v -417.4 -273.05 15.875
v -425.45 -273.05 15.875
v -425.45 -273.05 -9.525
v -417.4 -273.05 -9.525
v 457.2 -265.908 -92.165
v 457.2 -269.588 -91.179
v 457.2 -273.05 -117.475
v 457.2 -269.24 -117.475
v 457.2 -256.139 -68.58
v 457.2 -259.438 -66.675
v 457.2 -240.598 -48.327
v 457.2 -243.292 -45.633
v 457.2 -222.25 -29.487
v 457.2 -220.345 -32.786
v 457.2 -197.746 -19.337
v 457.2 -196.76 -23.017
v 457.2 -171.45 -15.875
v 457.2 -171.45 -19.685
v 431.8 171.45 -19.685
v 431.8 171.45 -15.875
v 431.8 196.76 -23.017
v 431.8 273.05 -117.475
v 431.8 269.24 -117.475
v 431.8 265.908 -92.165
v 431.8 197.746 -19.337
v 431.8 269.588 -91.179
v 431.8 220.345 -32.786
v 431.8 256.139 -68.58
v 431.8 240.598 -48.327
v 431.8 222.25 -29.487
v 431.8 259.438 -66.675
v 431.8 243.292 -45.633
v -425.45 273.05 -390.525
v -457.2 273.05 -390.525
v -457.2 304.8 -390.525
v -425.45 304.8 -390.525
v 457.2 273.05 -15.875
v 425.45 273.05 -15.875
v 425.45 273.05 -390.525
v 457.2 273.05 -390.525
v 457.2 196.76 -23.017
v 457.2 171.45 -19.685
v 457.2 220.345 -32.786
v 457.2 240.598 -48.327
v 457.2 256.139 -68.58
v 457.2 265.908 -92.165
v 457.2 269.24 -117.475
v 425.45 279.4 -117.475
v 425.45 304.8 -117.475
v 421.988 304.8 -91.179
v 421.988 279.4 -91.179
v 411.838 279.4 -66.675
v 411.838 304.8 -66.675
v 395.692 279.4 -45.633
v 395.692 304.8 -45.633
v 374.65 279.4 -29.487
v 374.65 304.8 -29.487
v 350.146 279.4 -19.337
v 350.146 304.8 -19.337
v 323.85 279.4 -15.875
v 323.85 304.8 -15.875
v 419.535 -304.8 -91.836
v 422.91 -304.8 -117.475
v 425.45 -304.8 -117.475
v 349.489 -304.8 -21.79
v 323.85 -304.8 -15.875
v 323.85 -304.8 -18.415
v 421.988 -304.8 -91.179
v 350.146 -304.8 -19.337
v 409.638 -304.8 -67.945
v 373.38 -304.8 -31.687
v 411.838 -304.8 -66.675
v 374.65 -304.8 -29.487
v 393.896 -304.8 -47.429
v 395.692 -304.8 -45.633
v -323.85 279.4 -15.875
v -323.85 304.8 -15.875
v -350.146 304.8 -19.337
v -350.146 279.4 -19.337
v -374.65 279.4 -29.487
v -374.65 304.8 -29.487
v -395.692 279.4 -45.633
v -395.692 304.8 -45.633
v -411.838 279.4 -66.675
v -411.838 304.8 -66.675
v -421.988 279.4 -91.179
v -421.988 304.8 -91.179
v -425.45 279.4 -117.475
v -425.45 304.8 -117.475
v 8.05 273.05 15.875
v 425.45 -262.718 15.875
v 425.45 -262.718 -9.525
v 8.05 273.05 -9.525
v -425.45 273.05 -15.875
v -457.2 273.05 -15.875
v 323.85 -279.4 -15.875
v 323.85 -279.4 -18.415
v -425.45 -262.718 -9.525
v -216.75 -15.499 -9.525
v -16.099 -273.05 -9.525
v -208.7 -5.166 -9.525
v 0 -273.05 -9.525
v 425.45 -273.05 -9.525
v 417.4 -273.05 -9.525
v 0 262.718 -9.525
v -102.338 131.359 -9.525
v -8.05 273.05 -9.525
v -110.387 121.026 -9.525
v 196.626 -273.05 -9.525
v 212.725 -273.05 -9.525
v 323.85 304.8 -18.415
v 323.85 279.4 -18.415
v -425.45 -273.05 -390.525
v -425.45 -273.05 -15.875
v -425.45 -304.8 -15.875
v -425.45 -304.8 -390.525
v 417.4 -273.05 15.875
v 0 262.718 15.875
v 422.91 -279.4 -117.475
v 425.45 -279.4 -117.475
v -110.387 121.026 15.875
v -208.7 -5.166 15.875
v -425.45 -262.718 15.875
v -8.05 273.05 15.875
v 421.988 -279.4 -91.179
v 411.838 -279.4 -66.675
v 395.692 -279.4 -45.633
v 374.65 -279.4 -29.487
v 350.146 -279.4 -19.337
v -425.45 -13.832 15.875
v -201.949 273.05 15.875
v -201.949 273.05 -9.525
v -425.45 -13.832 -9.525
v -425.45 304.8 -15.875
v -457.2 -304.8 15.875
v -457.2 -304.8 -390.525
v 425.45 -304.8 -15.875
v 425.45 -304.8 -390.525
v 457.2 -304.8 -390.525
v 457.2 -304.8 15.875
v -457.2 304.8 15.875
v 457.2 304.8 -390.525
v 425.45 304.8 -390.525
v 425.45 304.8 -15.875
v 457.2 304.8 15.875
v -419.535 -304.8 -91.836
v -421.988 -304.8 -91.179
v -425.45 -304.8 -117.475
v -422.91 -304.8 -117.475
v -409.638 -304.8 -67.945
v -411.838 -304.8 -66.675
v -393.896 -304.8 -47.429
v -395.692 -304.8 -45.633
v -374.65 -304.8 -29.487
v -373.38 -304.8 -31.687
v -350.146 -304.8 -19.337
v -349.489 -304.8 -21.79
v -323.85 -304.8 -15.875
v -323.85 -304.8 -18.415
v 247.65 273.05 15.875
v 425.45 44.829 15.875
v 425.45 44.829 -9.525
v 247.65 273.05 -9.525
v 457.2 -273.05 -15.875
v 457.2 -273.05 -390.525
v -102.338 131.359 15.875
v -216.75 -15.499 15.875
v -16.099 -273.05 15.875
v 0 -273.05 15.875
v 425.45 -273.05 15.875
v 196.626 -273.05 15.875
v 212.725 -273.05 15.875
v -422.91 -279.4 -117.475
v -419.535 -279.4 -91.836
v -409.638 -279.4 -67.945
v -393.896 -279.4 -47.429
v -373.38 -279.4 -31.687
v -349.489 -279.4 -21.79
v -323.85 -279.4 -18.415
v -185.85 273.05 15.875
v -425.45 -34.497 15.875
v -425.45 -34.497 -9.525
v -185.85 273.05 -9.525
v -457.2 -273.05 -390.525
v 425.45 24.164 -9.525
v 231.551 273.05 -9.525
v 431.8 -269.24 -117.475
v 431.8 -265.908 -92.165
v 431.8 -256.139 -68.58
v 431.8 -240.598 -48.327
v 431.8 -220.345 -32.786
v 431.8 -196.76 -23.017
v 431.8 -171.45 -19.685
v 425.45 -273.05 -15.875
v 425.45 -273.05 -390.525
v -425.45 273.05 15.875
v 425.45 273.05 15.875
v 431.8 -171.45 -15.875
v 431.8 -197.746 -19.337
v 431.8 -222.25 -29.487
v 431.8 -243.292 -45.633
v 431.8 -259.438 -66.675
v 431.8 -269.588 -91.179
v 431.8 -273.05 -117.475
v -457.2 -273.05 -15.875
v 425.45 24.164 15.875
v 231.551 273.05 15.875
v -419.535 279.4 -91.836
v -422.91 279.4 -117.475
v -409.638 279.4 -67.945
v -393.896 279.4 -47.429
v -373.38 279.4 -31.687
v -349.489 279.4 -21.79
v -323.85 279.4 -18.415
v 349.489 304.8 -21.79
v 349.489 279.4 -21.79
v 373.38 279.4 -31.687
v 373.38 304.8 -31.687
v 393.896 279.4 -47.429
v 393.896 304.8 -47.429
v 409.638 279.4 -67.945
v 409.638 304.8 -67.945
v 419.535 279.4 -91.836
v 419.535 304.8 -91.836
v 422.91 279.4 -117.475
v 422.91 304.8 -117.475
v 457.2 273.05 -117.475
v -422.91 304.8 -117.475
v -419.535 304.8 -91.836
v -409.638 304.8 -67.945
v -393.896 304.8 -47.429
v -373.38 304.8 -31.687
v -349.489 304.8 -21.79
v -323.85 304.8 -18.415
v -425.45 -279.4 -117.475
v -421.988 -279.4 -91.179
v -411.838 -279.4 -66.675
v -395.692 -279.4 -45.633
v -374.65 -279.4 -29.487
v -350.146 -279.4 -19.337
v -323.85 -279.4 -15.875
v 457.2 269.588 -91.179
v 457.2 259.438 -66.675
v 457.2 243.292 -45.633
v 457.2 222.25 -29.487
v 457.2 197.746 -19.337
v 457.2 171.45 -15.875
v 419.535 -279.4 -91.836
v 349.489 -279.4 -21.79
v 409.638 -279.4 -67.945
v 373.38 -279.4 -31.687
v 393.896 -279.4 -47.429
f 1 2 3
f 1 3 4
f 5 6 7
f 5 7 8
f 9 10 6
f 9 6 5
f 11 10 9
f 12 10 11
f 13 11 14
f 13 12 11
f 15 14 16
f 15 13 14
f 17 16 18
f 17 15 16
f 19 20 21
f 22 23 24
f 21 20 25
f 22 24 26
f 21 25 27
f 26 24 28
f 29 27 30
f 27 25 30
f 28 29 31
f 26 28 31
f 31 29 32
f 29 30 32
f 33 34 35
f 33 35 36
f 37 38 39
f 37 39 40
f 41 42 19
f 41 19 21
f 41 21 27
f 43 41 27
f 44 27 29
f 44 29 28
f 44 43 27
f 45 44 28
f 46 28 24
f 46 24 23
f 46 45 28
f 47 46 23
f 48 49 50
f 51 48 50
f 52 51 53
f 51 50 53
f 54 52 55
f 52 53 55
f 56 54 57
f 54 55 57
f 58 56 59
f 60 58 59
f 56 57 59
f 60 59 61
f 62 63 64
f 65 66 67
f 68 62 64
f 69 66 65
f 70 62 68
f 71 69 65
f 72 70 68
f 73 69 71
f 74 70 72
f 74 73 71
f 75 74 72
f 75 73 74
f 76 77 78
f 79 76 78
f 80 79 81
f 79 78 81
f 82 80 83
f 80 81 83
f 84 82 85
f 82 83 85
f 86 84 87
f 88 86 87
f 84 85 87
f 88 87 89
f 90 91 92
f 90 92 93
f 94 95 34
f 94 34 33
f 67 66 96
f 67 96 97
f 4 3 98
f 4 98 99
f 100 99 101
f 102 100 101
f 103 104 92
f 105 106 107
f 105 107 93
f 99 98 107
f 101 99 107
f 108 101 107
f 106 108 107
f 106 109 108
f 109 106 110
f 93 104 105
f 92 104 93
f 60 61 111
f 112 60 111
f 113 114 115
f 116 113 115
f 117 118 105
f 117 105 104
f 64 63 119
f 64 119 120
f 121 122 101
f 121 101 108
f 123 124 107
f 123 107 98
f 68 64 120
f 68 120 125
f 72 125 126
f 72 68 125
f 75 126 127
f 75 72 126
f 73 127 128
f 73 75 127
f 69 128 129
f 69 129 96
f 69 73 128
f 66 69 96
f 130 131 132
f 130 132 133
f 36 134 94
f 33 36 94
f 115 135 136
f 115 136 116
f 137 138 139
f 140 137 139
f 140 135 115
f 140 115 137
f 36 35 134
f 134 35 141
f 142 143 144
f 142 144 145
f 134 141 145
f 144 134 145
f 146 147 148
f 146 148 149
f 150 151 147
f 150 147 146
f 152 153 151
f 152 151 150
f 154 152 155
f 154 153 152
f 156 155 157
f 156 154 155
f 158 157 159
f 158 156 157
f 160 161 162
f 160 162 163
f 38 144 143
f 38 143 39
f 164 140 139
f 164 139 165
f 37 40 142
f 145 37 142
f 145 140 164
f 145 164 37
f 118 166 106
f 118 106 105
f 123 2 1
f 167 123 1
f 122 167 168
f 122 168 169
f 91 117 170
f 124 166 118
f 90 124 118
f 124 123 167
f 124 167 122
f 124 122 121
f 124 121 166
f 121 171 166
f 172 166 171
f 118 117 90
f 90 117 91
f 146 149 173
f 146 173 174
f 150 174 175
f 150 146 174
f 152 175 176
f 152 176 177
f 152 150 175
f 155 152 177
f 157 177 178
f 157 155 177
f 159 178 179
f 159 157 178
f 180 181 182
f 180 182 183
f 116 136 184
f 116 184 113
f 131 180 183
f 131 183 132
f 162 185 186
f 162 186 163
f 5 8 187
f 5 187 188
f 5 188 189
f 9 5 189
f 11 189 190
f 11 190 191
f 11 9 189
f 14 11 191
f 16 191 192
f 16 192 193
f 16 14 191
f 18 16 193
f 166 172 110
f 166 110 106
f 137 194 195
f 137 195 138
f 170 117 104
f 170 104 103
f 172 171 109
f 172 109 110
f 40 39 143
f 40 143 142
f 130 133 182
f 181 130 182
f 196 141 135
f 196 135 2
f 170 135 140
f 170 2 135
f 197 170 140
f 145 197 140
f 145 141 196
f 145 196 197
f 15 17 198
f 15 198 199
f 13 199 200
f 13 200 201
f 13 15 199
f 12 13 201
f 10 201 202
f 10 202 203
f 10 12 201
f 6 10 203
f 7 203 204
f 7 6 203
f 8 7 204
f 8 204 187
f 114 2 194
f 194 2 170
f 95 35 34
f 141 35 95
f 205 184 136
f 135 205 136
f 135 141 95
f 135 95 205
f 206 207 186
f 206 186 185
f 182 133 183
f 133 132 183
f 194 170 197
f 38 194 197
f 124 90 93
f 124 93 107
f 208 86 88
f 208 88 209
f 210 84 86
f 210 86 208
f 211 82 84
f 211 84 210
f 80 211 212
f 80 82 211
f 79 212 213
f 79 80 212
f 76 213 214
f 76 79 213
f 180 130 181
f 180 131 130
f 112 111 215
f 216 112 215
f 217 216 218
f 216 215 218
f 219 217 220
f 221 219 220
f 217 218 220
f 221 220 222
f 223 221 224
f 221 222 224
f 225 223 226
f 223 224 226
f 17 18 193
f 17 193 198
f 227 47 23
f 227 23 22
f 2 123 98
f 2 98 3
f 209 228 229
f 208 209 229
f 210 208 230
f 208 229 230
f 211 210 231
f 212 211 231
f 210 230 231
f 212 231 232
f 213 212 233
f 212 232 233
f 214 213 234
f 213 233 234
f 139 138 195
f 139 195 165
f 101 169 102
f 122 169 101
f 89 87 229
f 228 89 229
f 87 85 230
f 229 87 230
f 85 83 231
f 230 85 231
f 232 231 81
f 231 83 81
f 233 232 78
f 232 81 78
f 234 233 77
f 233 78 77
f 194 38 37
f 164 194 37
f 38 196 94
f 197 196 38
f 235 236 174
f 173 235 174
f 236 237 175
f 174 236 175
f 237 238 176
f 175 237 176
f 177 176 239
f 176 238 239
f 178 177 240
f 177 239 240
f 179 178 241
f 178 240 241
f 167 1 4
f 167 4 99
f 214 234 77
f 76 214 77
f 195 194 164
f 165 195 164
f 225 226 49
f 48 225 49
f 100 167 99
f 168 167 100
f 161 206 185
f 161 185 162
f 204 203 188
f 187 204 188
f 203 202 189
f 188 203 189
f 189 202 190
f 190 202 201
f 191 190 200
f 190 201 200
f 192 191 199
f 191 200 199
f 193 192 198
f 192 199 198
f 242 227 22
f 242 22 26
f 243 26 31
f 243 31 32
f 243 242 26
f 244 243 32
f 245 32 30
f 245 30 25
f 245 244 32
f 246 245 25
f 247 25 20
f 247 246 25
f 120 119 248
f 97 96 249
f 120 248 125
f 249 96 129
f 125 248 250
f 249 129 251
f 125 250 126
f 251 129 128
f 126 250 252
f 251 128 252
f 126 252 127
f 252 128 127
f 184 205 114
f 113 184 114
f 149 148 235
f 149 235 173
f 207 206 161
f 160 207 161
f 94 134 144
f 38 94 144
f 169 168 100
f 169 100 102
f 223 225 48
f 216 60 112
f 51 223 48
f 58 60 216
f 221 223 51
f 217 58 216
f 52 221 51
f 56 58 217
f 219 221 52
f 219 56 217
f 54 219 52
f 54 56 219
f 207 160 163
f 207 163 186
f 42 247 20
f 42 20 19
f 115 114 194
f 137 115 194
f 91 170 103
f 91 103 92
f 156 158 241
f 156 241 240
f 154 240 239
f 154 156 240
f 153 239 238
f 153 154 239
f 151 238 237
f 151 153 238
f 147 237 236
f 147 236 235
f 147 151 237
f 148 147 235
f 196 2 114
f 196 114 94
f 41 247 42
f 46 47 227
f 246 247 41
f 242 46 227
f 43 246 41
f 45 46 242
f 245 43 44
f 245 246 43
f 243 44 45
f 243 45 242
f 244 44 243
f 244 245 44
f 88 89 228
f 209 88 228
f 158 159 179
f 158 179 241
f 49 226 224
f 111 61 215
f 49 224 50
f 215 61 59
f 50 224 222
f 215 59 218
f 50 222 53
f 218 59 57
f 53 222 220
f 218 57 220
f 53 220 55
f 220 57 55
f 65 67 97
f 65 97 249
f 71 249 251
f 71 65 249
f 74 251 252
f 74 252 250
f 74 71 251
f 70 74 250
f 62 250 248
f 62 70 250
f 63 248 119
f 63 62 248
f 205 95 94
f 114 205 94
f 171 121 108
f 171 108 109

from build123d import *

# Parameters (mm, degrees)
F0_W      = 914.4
F0_H      = 609.6
F1_DEPTH  = 15.875
F2_W      = 850.9
F2_H      = 546.1
F3_DEPTH  = 31.751
F5_DEPTH  = 25.4
F6_W      = 31.75
F6_H      = 31.75
F7_DEPTH  = 374.65
F9_DEPTH  = 25.4
F12_DEPTH = 25.4


# Not quite as in the source:
# - a feature of the source that left no trace in its solid (it failed there, or was rolled back) is left out
# - a feature names something its author has since deleted; it is built from what else it names


with BuildPart() as f1:
    # F0 (on Top) → F1 (new body, symmetric)
    with BuildSketch(Plane.XY):
        Rectangle(F0_W, F0_H)
    extrude(amount=F1_DEPTH, both=True)

    # F2 (on face) → F3 (cut, through all)
    with BuildSketch(Plane.XY.offset(15.875)):
        Rectangle(F2_W, F2_H)
    extrude(amount=-F3_DEPTH, mode=Mode.SUBTRACT)

    # F6 (on face) → F7 (join)
    with BuildSketch(Plane(origin=(0, 0, -15.875), x_dir=(1, 0, 0), z_dir=(0, 0, -1))):
        with Locations((-441.325, 288.925)):
            Rectangle(F6_W, F6_H)
        with Locations((-441.325, -288.925)):
            Rectangle(F6_W, F6_H)
        with Locations((441.325, 288.925)):
            Rectangle(F6_W, F6_H)
        with Locations((441.325, -288.925)):
            Rectangle(F6_W, F6_H)
    extrude(amount=F7_DEPTH)


with BuildPart() as f5:
    # F4 (on face) → F5 (new body)
    with BuildSketch(Plane.XY.offset(15.875)):
        Polygon((-8.0496105111, 273.05), (-425.45, -262.7176641201), (-425.45, -273.05), (-417.4003894889, -273.05), (-216.7498052556, -15.4985038199), (-208.7001947444, -5.16616794), (-110.3873052556, 121.0264961801), (-102.3376947444, 131.35883206), (0, 262.7176641201), align=None)
        Polygon((8.0496105111, 273.05), (-8.0496105111, 273.05), (0, 262.7176641201), (417.4003894889, -273.05), (425.45, -273.05), (425.45, -262.7176641201), align=None)
        Polygon((212.725, -273.05), (-102.3376947444, 131.35883206), (-110.3873052556, 121.0264961801), (196.6257789778, -273.05), align=None)
        Polygon((-208.7001947444, -5.16616794), (-216.7498052556, -15.4985038199), (-16.0992210222, -273.05), (0, -273.05), align=None)
    extrude(amount=-F5_DEPTH)


with BuildPart() as f5b:
    # F4 (on face) → F5, piece 2 (new body)
    with BuildSketch(Plane.XY.offset(15.875)):
        Polygon((231.5507789778, 273.05), (425.45, 24.1644327177), (425.45, 44.8291044776), (247.65, 273.05), align=None)
    extrude(amount=-F5_DEPTH)


with BuildPart() as f5c:
    # F4 (on face) → F5, piece 3 (new body)
    with BuildSketch(Plane.XY.offset(15.875)):
        Polygon((-425.45, -13.8320968378), (-425.45, -34.4967685977), (-185.8496105111, 273.05), (-201.9488315334, 273.05), align=None)
    extrude(amount=-F5_DEPTH)


with BuildPart() as f9:
    # F8 (on face) → F9 (new body)
    with BuildSketch(Plane.XZ.offset(304.8)):
        with BuildLine():
            Line((-323.85, -18.415), (-323.85, -15.875))
            ThreePointArc((-323.85, -15.875), (-395.6920489686, -45.6329510314), (-425.45, -117.475))
            Line((-425.45, -117.475), (-422.91, -117.475))
            ThreePointArc((-422.91, -117.475), (-393.8959977443, -47.4290022557), (-323.85, -18.415))
        make_face()
    extrude(amount=-F9_DEPTH)


with BuildPart() as f9b:
    # F8 (on face) → F9, piece 2 (new body)
    with BuildSketch(Plane.XZ.offset(304.8)):
        with BuildLine():
            Line((323.85, -15.875), (323.85, -18.415))
            ThreePointArc((323.85, -18.415), (393.8959977443, -47.4290022557), (422.91, -117.475))
            Line((422.91, -117.475), (425.45, -117.475))
            ThreePointArc((425.45, -117.475), (395.6920489686, -45.6329510314), (323.85, -15.875))
        make_face()
    extrude(amount=-F9_DEPTH)


with BuildPart() as f10_1:
    # F10: instance of F9
    add(f9.part.mirror(Plane.XZ))


with BuildPart() as f10_2:
    # F10: instance of F9b
    add(f9b.part.mirror(Plane.XZ))


with BuildPart() as f12:
    # F11 (on face) → F12 (new body)
    with BuildSketch(Plane.YZ.offset(457.2)):
        with BuildLine():
            ThreePointArc((273.05, -117.475), (243.2920489686, -45.6329510314), (171.45, -15.875))
            Line((171.45, -15.875), (171.45, -19.685))
            ThreePointArc((171.45, -19.685), (240.5979721322, -48.3270278678), (269.24, -117.475))
            Line((269.24, -117.475), (273.05, -117.475))
        make_face()
    extrude(amount=-F12_DEPTH)


with BuildPart() as f12b:
    # F11 (on face) → F12, piece 2 (new body)
    with BuildSketch(Plane.YZ.offset(457.2)):
        with BuildLine():
            ThreePointArc((-269.24, -117.475), (-240.5979721322, -48.3270278678), (-171.45, -19.685))
            Line((-171.45, -19.685), (-171.45, -15.875))
            ThreePointArc((-171.45, -15.875), (-243.2920489686, -45.6329510314), (-273.05, -117.475))
            Line((-273.05, -117.475), (-269.24, -117.475))
        make_face()
    extrude(amount=-F12_DEPTH)


solid = Compound([f1.part, f5.part, f5b.part, f5c.part, f9.part, f9b.part, f10_1.part, f10_2.part, f12.part, f12b.part])
